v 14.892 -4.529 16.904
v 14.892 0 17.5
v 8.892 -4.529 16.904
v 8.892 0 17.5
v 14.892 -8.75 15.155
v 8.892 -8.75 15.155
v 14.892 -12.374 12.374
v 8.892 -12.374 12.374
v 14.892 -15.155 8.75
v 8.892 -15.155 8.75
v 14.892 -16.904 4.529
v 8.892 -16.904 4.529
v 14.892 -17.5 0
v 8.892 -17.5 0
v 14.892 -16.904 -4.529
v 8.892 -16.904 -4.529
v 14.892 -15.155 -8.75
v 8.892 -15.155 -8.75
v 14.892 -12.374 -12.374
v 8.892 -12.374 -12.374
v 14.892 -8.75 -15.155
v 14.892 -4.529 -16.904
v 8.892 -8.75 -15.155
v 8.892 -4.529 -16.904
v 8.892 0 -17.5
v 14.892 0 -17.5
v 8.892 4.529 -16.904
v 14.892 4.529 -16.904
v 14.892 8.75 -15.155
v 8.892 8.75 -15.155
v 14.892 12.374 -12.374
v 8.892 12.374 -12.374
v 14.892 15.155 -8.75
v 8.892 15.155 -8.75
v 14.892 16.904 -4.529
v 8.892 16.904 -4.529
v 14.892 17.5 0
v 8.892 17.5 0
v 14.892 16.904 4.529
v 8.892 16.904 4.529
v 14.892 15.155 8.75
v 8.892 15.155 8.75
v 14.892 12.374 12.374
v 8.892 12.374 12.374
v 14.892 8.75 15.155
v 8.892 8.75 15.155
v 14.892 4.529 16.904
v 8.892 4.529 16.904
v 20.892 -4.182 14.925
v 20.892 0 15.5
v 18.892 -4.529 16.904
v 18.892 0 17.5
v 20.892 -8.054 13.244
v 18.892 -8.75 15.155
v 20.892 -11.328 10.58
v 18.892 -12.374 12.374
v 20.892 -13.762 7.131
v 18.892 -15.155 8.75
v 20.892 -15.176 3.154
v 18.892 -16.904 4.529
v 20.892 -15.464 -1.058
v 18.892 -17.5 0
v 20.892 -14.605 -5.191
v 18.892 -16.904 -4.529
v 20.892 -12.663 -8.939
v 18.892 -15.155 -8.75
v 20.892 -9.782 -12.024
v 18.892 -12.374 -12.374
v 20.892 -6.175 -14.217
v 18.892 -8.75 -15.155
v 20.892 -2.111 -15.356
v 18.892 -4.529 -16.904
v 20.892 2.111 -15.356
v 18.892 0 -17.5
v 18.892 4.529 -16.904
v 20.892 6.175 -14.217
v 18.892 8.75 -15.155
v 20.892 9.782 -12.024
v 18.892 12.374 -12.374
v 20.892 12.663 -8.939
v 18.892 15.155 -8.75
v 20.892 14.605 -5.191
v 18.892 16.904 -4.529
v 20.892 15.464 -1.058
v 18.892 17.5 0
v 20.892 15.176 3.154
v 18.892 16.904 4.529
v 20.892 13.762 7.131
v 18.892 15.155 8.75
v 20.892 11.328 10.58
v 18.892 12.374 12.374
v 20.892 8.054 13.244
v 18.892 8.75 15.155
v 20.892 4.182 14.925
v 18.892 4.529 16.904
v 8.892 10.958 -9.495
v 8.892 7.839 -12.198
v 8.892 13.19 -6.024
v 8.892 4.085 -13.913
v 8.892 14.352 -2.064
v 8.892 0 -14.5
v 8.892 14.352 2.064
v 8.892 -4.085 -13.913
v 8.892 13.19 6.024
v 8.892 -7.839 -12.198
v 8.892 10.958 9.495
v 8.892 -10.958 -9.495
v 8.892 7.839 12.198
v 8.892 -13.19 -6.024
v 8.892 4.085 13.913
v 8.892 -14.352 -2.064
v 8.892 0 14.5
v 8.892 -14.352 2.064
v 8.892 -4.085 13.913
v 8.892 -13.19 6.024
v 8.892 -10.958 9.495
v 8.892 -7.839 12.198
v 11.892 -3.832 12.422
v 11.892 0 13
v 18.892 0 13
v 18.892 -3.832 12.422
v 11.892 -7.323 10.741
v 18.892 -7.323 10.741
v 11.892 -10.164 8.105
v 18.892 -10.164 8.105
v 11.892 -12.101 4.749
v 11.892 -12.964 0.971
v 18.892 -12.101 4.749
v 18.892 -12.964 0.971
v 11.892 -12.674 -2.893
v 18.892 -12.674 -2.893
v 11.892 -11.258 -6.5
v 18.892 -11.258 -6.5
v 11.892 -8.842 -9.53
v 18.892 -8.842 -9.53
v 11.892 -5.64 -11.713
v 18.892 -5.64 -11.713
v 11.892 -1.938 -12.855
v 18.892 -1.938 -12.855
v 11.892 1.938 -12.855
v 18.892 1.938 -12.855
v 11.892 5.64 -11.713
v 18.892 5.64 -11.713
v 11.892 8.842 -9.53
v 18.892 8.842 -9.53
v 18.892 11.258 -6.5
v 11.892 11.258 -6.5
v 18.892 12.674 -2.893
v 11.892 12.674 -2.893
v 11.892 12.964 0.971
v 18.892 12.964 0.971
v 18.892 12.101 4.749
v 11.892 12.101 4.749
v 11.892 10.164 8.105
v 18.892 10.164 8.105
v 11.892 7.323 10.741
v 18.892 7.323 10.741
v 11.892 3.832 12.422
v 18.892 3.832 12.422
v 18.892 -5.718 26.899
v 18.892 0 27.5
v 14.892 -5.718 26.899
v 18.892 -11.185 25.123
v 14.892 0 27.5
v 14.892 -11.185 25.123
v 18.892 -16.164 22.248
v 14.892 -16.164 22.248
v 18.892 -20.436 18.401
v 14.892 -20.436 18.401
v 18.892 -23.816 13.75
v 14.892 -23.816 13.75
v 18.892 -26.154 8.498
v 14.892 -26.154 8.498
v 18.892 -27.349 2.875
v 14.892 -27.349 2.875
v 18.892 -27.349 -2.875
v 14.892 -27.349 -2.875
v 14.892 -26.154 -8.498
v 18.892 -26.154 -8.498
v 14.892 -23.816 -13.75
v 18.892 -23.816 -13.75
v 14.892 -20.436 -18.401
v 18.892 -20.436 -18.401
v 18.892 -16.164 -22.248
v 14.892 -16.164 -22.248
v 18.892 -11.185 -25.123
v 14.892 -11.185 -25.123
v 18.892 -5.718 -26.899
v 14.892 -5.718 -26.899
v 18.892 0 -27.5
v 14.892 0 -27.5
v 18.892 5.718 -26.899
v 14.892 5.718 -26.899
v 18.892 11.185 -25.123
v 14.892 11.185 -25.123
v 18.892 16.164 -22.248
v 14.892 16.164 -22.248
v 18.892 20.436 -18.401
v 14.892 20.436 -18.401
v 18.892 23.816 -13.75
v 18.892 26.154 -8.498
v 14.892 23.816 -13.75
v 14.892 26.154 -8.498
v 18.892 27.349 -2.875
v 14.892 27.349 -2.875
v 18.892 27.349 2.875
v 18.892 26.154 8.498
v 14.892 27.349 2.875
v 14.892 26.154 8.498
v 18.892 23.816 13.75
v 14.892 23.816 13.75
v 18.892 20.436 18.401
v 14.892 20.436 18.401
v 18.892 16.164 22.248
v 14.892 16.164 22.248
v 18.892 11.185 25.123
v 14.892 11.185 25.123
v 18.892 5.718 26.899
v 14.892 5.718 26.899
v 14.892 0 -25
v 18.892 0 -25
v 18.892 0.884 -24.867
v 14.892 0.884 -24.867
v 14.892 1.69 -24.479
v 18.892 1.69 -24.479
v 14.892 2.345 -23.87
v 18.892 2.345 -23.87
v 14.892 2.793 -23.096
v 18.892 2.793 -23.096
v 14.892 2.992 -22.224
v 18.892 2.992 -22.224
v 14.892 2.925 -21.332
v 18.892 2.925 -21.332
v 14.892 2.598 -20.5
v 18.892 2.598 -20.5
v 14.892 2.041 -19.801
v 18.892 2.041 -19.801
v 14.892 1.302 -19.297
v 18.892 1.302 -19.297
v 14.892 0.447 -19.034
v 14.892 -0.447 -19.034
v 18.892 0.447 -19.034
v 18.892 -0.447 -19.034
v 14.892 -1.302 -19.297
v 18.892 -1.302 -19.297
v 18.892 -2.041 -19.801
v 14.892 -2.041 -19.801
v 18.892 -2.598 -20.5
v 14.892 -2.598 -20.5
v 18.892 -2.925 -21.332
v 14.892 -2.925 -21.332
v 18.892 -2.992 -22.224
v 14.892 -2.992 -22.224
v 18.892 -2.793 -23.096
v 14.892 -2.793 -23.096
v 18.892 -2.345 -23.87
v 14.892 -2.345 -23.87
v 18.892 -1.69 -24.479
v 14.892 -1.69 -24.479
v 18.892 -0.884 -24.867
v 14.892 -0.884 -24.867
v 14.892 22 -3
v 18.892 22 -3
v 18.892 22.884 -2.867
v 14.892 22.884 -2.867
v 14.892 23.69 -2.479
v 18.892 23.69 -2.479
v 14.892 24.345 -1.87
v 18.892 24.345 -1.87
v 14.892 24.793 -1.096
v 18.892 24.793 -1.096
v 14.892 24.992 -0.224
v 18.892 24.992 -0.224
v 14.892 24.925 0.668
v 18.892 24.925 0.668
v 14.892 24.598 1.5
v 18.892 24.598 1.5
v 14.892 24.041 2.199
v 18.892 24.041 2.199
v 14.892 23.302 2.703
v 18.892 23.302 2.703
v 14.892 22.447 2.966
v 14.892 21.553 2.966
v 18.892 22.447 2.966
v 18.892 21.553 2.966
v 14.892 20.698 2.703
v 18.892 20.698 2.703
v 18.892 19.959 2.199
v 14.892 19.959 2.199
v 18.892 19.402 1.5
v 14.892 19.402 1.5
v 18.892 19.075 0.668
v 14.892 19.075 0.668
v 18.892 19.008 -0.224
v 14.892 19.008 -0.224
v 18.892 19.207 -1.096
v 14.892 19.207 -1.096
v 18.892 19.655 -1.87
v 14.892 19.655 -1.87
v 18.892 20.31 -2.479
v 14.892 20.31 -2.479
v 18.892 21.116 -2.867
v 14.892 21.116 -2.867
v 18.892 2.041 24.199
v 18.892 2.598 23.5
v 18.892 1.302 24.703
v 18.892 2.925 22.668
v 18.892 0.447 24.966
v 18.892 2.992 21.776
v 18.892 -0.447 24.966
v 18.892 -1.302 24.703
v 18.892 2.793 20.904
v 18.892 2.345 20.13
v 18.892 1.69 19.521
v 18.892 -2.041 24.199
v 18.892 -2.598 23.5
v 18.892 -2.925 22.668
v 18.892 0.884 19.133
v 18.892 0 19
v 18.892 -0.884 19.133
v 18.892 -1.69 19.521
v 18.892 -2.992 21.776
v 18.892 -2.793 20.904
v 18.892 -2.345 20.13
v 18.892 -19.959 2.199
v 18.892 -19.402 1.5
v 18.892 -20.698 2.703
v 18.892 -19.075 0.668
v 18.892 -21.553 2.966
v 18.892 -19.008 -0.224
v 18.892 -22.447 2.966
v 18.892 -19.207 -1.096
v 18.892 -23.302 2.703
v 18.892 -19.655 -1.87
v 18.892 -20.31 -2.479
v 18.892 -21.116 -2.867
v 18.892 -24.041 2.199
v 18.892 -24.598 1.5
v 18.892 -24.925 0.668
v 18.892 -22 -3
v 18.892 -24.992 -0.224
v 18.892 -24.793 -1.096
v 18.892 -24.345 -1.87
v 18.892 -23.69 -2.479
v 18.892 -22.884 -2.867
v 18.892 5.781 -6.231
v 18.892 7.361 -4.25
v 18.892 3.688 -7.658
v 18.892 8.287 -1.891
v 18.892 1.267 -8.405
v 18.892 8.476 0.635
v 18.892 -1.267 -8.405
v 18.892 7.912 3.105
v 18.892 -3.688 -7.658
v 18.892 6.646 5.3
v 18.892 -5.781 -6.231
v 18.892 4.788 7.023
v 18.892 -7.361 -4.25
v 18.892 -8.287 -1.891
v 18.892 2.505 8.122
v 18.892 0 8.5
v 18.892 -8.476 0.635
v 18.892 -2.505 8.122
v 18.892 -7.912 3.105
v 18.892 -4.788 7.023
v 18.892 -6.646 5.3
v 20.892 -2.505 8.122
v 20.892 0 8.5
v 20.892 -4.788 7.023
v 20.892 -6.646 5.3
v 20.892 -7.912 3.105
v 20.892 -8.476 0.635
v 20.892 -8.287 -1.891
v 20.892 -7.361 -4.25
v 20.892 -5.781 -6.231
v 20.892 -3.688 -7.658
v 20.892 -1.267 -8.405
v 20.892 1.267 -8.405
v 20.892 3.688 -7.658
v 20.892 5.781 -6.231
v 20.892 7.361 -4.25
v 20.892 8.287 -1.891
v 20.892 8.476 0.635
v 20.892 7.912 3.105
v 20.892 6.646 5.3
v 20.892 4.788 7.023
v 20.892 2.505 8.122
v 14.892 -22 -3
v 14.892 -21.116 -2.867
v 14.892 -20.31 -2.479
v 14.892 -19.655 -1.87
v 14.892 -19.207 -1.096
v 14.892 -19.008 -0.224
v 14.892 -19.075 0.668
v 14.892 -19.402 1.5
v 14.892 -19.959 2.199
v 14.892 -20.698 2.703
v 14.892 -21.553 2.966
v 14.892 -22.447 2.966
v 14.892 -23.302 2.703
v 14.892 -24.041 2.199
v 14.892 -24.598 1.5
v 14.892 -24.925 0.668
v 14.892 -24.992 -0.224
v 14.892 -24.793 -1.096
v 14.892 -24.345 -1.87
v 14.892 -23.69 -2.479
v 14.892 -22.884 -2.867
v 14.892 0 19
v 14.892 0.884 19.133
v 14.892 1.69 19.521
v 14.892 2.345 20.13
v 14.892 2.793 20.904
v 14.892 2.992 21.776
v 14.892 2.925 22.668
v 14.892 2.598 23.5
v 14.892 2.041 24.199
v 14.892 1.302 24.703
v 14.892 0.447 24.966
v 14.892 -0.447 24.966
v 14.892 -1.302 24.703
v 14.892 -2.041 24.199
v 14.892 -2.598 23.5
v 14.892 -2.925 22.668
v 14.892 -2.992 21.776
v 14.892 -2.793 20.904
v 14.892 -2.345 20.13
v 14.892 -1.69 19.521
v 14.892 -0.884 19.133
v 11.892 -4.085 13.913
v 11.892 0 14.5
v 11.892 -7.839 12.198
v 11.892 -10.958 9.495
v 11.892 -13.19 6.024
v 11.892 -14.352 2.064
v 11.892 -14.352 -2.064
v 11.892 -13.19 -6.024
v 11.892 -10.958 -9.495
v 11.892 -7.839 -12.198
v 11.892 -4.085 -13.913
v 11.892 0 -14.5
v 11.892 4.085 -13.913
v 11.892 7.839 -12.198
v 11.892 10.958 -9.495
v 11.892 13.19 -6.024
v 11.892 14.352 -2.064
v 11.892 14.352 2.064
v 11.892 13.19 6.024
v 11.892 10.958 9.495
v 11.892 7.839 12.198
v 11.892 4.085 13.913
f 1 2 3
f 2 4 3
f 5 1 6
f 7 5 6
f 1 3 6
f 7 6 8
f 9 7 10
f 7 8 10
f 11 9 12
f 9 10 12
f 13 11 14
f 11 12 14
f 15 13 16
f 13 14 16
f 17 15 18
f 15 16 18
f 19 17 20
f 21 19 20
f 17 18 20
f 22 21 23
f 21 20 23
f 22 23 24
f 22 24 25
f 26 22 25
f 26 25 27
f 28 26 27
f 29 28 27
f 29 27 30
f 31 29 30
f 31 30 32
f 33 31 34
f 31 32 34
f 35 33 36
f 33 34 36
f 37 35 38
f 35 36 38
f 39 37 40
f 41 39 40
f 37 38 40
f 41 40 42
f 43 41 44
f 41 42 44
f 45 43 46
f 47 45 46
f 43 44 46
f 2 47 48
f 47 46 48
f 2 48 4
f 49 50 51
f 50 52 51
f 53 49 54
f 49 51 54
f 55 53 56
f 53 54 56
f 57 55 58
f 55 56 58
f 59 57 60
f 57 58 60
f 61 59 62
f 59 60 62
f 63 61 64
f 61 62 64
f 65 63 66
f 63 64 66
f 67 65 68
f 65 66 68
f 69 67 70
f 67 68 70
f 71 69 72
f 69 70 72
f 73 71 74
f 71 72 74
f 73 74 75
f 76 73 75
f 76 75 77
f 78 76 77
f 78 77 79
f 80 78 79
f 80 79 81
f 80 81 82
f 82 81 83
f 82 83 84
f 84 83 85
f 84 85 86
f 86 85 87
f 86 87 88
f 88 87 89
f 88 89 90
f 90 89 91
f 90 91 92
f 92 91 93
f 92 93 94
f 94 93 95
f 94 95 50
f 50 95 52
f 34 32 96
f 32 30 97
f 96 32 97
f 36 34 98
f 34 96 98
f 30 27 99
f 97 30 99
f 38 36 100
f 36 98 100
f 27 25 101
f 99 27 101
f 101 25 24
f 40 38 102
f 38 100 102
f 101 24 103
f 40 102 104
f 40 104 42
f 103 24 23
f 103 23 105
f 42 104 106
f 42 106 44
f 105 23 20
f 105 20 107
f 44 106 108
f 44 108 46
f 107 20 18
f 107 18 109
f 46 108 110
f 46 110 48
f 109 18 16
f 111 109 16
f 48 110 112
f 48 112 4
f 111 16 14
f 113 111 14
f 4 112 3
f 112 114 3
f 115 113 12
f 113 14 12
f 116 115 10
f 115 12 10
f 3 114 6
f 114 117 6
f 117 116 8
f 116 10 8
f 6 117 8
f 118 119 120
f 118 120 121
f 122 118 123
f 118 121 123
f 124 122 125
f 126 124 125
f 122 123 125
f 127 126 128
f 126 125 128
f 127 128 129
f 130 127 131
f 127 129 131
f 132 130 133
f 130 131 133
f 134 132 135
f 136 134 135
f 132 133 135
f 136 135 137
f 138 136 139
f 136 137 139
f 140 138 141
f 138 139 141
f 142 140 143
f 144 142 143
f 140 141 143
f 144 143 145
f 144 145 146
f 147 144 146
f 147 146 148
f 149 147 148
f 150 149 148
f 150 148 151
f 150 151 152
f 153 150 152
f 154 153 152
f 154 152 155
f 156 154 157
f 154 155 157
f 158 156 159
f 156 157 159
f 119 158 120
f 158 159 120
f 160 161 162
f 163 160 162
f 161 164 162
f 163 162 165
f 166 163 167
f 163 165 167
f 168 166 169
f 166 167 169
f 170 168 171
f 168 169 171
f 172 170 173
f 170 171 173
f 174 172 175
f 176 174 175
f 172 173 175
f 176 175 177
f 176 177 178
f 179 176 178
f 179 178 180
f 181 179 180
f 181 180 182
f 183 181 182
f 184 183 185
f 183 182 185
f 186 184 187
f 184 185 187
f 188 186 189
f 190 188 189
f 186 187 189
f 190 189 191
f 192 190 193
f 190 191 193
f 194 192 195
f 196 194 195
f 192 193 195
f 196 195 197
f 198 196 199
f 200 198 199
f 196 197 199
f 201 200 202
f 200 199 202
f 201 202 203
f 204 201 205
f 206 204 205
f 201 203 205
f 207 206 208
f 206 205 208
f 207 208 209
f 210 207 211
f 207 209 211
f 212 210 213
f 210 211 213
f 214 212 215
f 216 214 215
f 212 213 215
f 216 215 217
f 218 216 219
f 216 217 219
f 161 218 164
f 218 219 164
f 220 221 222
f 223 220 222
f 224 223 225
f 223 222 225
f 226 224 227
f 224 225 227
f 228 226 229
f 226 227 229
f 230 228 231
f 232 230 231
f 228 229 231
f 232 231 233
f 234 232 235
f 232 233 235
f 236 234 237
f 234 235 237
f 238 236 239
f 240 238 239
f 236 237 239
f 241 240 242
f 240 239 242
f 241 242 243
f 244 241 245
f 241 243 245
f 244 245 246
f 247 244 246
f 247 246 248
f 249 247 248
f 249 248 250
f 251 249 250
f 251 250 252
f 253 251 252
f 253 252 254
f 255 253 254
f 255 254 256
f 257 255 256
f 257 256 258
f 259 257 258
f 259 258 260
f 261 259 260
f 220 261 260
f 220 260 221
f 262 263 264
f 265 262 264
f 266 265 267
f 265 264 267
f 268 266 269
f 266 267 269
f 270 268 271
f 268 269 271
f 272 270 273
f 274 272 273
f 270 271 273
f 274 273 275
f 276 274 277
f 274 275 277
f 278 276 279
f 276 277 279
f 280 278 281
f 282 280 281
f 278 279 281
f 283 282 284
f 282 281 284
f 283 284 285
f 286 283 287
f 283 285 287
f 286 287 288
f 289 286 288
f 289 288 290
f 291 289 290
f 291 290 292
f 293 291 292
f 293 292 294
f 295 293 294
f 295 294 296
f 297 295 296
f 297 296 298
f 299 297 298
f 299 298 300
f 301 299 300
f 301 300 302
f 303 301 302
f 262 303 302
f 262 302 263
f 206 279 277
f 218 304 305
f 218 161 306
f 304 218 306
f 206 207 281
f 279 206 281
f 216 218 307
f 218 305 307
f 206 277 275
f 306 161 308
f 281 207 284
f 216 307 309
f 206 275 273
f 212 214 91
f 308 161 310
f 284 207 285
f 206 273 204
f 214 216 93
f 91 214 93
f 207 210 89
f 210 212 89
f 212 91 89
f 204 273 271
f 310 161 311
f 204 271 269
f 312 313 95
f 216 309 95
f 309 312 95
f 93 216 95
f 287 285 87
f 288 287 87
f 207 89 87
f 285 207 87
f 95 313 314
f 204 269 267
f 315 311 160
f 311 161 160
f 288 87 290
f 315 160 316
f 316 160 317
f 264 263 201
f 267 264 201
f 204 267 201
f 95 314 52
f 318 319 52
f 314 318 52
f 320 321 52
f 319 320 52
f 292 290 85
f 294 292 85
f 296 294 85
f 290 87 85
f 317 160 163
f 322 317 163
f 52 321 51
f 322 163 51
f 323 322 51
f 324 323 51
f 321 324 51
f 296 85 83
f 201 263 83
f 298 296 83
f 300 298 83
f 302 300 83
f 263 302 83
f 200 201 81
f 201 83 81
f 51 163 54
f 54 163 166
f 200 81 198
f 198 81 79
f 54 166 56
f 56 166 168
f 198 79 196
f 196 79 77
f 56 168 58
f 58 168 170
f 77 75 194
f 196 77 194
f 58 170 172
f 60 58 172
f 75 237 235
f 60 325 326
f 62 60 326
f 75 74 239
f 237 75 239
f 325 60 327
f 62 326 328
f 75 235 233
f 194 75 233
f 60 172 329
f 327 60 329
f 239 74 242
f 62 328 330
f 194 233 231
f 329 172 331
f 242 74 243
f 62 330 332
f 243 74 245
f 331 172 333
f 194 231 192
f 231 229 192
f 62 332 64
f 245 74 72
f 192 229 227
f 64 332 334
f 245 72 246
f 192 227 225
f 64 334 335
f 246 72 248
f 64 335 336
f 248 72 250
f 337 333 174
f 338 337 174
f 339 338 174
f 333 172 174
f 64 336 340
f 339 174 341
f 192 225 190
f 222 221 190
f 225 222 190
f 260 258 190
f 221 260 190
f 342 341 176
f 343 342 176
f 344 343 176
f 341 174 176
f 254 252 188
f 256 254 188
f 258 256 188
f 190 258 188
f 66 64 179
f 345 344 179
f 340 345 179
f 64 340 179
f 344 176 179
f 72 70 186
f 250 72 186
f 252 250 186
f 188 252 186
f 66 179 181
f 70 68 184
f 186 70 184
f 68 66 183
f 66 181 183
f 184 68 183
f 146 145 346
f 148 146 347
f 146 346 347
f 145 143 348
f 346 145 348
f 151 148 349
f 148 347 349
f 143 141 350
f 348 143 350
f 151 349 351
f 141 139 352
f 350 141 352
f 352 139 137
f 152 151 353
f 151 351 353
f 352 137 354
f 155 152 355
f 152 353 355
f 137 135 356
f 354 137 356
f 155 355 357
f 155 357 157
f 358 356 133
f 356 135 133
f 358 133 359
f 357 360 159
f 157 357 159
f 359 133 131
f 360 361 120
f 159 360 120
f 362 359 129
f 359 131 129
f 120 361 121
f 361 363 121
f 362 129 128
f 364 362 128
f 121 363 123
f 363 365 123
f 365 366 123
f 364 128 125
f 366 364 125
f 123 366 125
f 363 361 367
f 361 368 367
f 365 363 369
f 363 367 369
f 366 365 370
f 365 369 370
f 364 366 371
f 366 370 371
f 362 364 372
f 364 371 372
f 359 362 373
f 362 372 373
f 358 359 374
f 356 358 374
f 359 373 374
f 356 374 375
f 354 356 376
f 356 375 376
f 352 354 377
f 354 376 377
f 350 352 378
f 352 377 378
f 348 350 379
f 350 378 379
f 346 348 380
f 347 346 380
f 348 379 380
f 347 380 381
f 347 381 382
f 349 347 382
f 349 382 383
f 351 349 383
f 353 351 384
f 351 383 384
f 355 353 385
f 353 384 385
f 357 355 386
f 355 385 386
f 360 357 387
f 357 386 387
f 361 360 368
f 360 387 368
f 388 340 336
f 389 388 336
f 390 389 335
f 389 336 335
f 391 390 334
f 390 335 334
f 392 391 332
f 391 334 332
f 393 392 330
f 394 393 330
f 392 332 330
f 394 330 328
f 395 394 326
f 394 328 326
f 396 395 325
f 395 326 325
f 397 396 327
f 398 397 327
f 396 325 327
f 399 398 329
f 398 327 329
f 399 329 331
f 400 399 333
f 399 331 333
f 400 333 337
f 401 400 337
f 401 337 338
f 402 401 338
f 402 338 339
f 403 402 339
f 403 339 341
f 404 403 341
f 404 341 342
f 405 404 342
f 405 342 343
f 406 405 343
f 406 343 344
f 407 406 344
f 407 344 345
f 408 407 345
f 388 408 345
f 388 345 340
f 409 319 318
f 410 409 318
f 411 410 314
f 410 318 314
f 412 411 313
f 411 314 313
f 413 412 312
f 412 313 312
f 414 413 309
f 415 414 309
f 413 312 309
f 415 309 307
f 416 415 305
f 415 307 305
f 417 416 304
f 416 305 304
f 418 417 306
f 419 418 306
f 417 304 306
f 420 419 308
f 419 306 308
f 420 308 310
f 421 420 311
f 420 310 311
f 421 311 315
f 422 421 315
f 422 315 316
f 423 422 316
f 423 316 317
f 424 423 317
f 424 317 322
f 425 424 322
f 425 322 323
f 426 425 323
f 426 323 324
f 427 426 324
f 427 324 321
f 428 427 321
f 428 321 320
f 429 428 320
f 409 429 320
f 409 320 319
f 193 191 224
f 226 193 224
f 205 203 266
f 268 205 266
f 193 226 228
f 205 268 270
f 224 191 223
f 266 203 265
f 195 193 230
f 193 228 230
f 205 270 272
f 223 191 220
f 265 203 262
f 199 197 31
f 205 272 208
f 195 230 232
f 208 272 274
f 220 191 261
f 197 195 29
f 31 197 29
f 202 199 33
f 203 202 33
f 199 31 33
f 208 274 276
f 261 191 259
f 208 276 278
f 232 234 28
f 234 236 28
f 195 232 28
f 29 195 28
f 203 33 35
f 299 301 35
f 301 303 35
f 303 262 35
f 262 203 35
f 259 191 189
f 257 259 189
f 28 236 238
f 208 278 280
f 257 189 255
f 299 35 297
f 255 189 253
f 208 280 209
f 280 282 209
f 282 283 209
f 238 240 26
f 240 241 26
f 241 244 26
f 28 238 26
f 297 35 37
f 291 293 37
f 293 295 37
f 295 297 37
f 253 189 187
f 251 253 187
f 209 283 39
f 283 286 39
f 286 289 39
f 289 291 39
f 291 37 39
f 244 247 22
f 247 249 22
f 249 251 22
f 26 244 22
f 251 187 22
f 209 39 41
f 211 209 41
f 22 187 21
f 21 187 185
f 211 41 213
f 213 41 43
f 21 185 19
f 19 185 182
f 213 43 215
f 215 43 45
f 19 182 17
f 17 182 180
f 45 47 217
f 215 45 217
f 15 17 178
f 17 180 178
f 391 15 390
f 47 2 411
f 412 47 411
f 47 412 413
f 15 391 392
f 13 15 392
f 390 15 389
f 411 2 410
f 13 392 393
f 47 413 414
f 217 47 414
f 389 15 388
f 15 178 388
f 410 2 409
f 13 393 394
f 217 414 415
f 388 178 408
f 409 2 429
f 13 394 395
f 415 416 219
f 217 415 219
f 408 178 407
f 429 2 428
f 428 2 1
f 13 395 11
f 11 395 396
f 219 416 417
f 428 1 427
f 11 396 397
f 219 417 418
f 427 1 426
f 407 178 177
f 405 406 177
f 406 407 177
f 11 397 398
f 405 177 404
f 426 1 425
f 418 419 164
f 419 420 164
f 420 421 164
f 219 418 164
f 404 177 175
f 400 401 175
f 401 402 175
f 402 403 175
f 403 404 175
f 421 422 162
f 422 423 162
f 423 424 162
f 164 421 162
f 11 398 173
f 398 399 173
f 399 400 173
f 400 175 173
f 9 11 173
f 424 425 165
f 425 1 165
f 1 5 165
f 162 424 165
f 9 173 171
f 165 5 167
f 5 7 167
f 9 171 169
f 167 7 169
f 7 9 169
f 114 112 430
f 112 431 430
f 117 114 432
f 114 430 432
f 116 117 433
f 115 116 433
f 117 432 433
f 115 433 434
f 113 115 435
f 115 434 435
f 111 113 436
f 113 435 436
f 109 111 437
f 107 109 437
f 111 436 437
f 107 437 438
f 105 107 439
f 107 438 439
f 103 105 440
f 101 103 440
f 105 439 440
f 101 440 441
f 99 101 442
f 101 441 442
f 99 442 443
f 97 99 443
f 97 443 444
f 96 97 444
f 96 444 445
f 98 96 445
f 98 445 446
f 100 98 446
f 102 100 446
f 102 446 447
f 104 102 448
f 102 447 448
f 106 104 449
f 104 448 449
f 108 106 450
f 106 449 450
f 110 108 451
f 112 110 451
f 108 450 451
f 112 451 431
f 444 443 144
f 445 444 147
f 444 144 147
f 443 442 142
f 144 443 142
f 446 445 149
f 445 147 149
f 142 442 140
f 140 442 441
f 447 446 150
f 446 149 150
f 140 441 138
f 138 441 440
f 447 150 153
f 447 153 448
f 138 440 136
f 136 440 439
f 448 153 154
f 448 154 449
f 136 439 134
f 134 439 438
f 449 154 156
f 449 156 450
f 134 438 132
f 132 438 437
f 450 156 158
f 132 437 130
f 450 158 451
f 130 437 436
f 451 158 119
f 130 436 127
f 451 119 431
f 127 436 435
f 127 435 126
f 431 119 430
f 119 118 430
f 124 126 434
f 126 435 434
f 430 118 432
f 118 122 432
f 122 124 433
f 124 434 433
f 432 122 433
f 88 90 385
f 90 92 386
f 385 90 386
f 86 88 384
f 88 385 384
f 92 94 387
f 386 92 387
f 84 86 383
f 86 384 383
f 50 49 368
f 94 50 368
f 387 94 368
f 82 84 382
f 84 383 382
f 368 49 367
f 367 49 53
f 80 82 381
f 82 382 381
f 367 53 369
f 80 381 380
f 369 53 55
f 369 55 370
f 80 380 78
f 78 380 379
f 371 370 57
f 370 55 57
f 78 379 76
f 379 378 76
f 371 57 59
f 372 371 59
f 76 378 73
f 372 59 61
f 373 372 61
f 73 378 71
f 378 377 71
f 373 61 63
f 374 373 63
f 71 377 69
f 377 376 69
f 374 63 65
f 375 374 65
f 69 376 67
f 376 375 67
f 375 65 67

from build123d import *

# Parameters (mm, degrees)
SKETCH3_R          = 3
CUT_EXTRUDE1_DEPTH = 41.155946011


with BuildPart() as part:
    # Sketch2 → Revolve1 (revolve)
    with BuildSketch(Plane(origin=(0, 0, 0), x_dir=(1, 0, 0), z_dir=(0, 1, 0)), mode=Mode.PRIVATE) as revolve1_sk:
        Polygon((18.892201274, 8.5), (20.892201274, 8.5), (20.892201274, 15.5), (18.892201274, 17.5), (18.892201274, 27.5), (14.892201274, 27.5), (14.892201274, 17.5), (8.892201274, 17.5), (8.892201274, 14.5), (11.892201274, 14.5), (11.892201274, 13), (18.892201274, 13), align=None)
    revolve(revolve1_sk.sketch.rotate(Axis((0, 0, 0), (1, 0, 0)), 180), axis=Axis((0, 0, 0), (1, 0, 0)))

    # Sketch3 → Cut-Extrude1 (cut, through all)
    with BuildSketch(Plane(origin=(18.892201274, 0, 0), x_dir=(0, 0, -1), z_dir=(1, 0, 0))):
        with Locations((0, 22)):
            Circle(SKETCH3_R)
        with Locations((22, 0)):
            Circle(SKETCH3_R)
        with Locations((0, -22)):
            Circle(SKETCH3_R)
        with Locations((-22, 0)):
            Circle(SKETCH3_R)
    extrude(amount=-CUT_EXTRUDE1_DEPTH, mode=Mode.SUBTRACT)


solid = part.part
